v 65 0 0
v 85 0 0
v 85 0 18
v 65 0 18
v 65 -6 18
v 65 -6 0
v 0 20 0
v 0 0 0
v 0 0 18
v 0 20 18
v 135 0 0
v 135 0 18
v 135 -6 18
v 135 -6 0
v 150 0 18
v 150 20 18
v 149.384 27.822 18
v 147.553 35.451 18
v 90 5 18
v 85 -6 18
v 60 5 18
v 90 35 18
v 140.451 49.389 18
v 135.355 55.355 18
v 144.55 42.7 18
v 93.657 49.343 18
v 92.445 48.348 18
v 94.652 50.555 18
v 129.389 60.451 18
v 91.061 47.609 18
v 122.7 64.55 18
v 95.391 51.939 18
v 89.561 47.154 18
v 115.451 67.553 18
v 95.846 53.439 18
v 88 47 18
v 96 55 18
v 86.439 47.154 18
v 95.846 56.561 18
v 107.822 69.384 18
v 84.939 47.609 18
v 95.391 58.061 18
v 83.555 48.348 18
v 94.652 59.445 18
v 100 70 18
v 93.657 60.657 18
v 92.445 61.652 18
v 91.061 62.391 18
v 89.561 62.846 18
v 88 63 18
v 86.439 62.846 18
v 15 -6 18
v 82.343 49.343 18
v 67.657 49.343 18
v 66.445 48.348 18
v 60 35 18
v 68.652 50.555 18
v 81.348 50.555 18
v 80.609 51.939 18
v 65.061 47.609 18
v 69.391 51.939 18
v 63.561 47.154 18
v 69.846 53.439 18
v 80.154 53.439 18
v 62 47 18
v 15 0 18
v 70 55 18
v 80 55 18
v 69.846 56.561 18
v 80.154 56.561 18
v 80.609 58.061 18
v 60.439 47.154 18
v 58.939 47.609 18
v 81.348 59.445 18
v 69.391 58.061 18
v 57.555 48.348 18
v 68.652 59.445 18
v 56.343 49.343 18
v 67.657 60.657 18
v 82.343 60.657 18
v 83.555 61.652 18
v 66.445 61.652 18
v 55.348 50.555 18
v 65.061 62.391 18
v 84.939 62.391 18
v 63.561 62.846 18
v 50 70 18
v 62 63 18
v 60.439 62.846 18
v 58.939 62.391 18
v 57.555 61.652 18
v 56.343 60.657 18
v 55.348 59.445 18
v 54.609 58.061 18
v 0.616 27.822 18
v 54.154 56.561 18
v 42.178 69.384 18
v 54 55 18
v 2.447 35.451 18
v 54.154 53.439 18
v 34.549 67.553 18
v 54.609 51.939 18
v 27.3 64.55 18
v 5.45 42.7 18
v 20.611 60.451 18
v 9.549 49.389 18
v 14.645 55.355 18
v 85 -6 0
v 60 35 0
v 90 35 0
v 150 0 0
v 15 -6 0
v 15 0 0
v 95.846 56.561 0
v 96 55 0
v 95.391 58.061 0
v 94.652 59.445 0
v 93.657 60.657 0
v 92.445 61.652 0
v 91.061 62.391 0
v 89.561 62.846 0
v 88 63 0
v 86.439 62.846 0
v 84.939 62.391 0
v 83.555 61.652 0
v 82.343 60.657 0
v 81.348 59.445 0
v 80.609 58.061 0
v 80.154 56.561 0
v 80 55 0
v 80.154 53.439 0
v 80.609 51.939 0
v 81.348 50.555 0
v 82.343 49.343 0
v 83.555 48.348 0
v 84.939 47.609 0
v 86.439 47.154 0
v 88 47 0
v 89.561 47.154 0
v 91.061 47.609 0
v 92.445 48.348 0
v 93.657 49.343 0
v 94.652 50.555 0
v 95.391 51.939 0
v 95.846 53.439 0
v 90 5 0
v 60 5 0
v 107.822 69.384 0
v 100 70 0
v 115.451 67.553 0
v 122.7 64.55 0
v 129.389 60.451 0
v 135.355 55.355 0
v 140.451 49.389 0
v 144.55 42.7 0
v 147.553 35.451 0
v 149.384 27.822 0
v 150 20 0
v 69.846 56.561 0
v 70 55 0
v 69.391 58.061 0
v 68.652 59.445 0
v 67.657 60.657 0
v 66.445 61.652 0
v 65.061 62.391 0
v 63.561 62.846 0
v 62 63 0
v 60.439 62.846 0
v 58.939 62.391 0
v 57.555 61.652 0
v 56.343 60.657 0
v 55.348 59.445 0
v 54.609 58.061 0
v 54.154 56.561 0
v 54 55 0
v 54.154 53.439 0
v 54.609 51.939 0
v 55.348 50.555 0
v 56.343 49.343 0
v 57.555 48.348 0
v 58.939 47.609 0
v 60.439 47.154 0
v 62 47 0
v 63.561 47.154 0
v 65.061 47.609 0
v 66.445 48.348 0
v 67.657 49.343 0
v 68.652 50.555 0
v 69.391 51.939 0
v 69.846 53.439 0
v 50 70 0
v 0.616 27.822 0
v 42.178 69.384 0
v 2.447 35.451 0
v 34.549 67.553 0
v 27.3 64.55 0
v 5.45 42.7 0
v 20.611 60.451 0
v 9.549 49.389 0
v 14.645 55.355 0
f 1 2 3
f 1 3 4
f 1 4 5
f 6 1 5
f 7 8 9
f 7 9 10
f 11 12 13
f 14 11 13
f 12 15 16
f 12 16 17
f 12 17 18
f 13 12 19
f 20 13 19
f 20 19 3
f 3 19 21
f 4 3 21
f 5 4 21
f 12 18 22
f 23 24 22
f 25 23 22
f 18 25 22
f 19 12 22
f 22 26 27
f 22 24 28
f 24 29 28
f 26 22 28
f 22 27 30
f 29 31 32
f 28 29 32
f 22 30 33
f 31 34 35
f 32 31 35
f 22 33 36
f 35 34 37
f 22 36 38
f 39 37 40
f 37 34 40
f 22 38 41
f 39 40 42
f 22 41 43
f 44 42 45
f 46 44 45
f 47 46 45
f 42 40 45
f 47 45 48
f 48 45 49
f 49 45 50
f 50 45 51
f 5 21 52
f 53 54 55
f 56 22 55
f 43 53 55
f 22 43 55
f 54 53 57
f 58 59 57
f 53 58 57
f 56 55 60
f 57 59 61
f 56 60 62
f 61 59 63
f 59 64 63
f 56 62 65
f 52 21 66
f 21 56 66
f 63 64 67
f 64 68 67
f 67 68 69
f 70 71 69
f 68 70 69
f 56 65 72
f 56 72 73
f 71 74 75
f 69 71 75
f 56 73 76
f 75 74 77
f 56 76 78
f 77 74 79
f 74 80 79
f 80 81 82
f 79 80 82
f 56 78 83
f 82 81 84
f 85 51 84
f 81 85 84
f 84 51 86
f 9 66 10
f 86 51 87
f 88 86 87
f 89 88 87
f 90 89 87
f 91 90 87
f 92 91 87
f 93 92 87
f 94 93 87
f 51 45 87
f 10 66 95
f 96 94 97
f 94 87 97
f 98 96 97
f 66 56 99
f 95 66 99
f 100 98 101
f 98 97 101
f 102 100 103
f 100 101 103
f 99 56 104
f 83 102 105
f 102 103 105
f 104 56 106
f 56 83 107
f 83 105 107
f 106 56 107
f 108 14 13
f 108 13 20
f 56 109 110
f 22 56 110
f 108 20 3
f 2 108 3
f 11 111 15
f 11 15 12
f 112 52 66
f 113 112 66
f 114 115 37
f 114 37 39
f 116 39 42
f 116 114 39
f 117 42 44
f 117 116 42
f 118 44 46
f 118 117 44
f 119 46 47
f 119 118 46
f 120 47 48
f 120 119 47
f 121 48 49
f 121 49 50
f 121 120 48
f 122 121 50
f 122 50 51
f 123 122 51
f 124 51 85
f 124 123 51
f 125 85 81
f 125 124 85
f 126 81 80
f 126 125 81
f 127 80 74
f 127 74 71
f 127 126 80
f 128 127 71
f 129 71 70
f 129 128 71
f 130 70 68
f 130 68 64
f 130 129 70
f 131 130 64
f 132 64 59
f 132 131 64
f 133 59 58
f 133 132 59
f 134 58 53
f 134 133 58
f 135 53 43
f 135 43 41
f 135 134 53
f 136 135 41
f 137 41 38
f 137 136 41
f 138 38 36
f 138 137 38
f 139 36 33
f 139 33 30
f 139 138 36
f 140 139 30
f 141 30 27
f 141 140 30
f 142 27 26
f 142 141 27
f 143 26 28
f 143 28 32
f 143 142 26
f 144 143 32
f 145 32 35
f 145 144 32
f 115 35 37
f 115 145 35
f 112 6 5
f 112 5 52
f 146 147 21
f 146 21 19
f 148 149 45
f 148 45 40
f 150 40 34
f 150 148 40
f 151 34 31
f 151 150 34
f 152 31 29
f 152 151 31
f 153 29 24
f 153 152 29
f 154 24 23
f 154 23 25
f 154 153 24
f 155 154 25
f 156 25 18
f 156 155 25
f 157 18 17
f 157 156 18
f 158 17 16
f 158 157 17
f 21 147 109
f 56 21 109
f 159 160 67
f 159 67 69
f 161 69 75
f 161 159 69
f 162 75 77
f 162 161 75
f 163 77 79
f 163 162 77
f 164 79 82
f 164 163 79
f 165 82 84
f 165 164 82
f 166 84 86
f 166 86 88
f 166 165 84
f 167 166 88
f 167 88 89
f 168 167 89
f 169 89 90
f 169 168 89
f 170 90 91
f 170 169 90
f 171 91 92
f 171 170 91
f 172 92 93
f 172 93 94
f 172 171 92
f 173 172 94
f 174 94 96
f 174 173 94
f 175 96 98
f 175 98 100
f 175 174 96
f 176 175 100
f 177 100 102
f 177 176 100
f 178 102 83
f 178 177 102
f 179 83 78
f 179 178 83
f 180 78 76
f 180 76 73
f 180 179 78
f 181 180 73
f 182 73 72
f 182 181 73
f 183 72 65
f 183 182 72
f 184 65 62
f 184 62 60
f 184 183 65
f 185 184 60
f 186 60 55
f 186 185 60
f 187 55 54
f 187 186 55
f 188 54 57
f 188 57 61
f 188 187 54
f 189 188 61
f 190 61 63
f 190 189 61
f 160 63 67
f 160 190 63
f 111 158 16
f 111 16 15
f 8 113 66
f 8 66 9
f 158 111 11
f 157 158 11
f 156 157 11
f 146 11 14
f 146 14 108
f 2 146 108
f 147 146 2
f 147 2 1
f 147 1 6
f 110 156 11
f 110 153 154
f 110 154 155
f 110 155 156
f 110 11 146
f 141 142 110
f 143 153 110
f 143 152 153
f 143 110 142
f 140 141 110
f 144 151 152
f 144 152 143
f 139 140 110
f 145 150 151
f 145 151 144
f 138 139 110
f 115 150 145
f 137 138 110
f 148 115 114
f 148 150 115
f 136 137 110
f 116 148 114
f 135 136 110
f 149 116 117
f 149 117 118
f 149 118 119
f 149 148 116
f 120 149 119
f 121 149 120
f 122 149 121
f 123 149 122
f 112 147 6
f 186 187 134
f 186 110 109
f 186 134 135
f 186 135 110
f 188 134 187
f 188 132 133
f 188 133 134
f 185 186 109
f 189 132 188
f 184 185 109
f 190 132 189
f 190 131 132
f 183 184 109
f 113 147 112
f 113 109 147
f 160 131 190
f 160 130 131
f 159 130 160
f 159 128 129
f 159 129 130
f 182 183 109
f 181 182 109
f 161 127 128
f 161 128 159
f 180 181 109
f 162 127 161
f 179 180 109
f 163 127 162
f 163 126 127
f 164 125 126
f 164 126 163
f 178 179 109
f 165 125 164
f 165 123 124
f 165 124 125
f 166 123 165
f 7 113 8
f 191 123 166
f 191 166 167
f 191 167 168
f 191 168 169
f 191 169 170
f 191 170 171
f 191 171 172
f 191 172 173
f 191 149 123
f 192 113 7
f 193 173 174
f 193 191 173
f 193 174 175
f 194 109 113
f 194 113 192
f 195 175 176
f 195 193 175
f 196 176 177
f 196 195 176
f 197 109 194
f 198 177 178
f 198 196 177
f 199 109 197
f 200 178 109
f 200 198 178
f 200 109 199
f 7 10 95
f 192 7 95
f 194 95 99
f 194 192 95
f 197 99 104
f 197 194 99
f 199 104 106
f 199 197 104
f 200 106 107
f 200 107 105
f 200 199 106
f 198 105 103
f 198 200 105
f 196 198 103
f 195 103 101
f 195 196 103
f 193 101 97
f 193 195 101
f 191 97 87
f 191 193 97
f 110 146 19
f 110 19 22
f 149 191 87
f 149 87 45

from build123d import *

# Parameters (mm, degrees)
ESQUISSE1_R        = 8
ESQUISSE1_W        = 30
ESQUISSE1_H        = 30
BOSS_EXTRU_1_DEPTH = 18


with BuildPart() as part:
    # Esquisse1 → Boss.-Extru.1 (new body)
    with BuildSketch(Plane.XY):
        with BuildLine():
            Line((0, 0), (0, 20))
            ThreePointArc((0, 20), (14.644660941, 55.355339059), (50, 70))
            Line((50, 70), (100, 70))
            ThreePointArc((100, 70), (135.355339059, 55.355339059), (150, 20))
            Line((150, 20), (150, 0))
            Line((150, 0), (135, 0))
            Line((135, 0), (135, -6))
            Line((135, -6), (85, -6))
            Line((85, -6), (85, 0))
            Line((85, 0), (65, 0))
            Line((65, 0), (65, -6))
            Line((65, -6), (15, -6))
            Line((15, -6), (15, 0))
            Line((15, 0), (0, 0))
        make_face()
        with Locations((62, 55)):
            Circle(ESQUISSE1_R, mode=Mode.SUBTRACT)
        with Locations((88, 55)):
            Circle(ESQUISSE1_R, mode=Mode.SUBTRACT)
        with Locations((75, 20)):
            Rectangle(ESQUISSE1_W, ESQUISSE1_H, mode=Mode.SUBTRACT)
    extrude(amount=BOSS_EXTRU_1_DEPTH)


solid = part.part
